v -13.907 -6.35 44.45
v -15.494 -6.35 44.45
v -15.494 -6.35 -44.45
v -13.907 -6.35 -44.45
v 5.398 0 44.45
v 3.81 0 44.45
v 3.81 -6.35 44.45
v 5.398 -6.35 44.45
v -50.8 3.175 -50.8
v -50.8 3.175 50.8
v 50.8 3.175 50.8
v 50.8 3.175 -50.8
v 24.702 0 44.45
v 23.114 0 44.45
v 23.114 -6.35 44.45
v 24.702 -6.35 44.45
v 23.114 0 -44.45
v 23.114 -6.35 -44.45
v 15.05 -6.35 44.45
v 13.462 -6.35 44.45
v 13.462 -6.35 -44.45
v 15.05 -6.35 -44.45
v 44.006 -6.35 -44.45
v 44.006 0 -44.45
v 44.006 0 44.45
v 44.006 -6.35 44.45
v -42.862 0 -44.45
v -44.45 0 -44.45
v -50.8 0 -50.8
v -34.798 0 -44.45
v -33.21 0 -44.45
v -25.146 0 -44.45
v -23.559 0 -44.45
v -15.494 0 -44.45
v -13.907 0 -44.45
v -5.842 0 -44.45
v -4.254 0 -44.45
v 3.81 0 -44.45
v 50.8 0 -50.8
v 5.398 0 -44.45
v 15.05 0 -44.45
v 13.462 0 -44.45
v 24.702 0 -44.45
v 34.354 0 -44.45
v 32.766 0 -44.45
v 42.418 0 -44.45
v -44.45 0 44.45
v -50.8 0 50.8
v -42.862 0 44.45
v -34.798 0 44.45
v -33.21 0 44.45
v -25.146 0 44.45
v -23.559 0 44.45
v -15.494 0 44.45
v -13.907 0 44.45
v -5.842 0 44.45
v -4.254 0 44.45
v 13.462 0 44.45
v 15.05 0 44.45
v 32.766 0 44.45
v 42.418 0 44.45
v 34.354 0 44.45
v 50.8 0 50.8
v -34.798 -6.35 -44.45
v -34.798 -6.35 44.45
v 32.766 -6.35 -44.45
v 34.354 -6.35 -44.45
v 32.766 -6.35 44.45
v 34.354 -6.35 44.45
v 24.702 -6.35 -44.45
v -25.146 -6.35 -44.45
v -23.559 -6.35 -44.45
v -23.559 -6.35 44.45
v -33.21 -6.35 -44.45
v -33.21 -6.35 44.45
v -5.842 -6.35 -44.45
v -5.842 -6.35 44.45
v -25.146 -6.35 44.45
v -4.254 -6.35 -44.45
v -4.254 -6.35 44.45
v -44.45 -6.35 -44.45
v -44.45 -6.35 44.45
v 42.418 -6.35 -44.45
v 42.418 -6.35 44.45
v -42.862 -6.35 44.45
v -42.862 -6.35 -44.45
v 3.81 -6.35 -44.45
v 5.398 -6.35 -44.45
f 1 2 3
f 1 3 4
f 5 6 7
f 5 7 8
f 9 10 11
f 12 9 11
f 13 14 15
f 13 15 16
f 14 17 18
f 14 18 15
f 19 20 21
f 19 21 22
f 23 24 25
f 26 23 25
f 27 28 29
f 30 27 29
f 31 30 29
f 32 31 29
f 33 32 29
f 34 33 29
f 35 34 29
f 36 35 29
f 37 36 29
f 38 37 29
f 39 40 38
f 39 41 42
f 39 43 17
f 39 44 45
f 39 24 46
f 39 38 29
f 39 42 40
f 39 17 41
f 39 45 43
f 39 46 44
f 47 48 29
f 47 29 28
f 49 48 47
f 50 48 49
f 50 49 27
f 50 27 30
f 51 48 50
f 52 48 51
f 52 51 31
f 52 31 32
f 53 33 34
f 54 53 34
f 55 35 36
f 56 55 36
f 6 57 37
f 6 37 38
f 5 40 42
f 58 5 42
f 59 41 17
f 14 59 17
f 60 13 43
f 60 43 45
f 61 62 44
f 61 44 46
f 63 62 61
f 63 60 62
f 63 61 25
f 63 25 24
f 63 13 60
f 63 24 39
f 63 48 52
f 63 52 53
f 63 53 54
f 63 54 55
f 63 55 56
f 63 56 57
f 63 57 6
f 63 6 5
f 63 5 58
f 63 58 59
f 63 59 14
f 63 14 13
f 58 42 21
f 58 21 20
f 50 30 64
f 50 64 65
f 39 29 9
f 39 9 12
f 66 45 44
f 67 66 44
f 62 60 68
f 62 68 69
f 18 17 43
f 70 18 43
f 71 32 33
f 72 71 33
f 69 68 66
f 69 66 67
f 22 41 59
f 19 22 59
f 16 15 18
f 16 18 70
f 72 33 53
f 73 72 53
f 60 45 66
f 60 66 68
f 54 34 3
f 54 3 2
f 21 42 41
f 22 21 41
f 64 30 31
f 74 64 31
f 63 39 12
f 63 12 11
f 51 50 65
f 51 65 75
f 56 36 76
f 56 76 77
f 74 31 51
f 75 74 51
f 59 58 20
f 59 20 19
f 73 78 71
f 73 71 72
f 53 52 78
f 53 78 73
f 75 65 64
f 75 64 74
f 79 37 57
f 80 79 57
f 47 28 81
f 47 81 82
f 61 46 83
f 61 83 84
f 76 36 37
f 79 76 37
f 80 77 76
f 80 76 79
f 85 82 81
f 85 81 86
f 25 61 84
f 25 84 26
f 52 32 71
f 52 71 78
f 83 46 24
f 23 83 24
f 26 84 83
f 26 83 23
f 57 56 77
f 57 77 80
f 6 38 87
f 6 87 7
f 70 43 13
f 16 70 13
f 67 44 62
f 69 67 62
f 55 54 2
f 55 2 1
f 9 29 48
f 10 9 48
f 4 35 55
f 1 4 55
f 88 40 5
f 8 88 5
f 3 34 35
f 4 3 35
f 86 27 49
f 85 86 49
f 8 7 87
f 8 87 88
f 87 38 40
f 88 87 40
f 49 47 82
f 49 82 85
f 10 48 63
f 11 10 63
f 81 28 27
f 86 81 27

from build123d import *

# Parameters (mm, degrees)
F0_W     = 101.6
F0_H     = 101.6
F1_DEPTH = 3.175
F2_W     = 1.5875
F2_H     = 88.9
F3_DEPTH = 6.35


with BuildPart() as f1:
    # F0 (on Front) → F1 (new body)
    with BuildSketch(Plane.XZ):
        Rectangle(F0_W, F0_H)
    extrude(amount=-F1_DEPTH)

    # F2 (on face) → F3 (join)
    with BuildSketch(Plane.XZ):
        with Locations((-43.65625, 0)):
            Rectangle(F2_W, F2_H)
        with Locations((-34.00425, 0)):
            Rectangle(F2_W, F2_H)
        with Locations((-24.35225, 0)):
            Rectangle(F2_W, F2_H)
        with Locations((-14.70025, 0)):
            Rectangle(F2_W, F2_H)
        with Locations((-5.04825, 0)):
            Rectangle(F2_W, F2_H)
        with Locations((4.60375, 0)):
            Rectangle(F2_W, F2_H)
        with Locations((14.25575, 0)):
            Rectangle(F2_W, F2_H)
        with Locations((23.90775, 0)):
            Rectangle(F2_W, F2_H)
        with Locations((33.55975, 0)):
            Rectangle(F2_W, F2_H)
        with Locations((43.21175, 0)):
            Rectangle(F2_W, F2_H)
    extrude(amount=F3_DEPTH)


solid = f1.part
